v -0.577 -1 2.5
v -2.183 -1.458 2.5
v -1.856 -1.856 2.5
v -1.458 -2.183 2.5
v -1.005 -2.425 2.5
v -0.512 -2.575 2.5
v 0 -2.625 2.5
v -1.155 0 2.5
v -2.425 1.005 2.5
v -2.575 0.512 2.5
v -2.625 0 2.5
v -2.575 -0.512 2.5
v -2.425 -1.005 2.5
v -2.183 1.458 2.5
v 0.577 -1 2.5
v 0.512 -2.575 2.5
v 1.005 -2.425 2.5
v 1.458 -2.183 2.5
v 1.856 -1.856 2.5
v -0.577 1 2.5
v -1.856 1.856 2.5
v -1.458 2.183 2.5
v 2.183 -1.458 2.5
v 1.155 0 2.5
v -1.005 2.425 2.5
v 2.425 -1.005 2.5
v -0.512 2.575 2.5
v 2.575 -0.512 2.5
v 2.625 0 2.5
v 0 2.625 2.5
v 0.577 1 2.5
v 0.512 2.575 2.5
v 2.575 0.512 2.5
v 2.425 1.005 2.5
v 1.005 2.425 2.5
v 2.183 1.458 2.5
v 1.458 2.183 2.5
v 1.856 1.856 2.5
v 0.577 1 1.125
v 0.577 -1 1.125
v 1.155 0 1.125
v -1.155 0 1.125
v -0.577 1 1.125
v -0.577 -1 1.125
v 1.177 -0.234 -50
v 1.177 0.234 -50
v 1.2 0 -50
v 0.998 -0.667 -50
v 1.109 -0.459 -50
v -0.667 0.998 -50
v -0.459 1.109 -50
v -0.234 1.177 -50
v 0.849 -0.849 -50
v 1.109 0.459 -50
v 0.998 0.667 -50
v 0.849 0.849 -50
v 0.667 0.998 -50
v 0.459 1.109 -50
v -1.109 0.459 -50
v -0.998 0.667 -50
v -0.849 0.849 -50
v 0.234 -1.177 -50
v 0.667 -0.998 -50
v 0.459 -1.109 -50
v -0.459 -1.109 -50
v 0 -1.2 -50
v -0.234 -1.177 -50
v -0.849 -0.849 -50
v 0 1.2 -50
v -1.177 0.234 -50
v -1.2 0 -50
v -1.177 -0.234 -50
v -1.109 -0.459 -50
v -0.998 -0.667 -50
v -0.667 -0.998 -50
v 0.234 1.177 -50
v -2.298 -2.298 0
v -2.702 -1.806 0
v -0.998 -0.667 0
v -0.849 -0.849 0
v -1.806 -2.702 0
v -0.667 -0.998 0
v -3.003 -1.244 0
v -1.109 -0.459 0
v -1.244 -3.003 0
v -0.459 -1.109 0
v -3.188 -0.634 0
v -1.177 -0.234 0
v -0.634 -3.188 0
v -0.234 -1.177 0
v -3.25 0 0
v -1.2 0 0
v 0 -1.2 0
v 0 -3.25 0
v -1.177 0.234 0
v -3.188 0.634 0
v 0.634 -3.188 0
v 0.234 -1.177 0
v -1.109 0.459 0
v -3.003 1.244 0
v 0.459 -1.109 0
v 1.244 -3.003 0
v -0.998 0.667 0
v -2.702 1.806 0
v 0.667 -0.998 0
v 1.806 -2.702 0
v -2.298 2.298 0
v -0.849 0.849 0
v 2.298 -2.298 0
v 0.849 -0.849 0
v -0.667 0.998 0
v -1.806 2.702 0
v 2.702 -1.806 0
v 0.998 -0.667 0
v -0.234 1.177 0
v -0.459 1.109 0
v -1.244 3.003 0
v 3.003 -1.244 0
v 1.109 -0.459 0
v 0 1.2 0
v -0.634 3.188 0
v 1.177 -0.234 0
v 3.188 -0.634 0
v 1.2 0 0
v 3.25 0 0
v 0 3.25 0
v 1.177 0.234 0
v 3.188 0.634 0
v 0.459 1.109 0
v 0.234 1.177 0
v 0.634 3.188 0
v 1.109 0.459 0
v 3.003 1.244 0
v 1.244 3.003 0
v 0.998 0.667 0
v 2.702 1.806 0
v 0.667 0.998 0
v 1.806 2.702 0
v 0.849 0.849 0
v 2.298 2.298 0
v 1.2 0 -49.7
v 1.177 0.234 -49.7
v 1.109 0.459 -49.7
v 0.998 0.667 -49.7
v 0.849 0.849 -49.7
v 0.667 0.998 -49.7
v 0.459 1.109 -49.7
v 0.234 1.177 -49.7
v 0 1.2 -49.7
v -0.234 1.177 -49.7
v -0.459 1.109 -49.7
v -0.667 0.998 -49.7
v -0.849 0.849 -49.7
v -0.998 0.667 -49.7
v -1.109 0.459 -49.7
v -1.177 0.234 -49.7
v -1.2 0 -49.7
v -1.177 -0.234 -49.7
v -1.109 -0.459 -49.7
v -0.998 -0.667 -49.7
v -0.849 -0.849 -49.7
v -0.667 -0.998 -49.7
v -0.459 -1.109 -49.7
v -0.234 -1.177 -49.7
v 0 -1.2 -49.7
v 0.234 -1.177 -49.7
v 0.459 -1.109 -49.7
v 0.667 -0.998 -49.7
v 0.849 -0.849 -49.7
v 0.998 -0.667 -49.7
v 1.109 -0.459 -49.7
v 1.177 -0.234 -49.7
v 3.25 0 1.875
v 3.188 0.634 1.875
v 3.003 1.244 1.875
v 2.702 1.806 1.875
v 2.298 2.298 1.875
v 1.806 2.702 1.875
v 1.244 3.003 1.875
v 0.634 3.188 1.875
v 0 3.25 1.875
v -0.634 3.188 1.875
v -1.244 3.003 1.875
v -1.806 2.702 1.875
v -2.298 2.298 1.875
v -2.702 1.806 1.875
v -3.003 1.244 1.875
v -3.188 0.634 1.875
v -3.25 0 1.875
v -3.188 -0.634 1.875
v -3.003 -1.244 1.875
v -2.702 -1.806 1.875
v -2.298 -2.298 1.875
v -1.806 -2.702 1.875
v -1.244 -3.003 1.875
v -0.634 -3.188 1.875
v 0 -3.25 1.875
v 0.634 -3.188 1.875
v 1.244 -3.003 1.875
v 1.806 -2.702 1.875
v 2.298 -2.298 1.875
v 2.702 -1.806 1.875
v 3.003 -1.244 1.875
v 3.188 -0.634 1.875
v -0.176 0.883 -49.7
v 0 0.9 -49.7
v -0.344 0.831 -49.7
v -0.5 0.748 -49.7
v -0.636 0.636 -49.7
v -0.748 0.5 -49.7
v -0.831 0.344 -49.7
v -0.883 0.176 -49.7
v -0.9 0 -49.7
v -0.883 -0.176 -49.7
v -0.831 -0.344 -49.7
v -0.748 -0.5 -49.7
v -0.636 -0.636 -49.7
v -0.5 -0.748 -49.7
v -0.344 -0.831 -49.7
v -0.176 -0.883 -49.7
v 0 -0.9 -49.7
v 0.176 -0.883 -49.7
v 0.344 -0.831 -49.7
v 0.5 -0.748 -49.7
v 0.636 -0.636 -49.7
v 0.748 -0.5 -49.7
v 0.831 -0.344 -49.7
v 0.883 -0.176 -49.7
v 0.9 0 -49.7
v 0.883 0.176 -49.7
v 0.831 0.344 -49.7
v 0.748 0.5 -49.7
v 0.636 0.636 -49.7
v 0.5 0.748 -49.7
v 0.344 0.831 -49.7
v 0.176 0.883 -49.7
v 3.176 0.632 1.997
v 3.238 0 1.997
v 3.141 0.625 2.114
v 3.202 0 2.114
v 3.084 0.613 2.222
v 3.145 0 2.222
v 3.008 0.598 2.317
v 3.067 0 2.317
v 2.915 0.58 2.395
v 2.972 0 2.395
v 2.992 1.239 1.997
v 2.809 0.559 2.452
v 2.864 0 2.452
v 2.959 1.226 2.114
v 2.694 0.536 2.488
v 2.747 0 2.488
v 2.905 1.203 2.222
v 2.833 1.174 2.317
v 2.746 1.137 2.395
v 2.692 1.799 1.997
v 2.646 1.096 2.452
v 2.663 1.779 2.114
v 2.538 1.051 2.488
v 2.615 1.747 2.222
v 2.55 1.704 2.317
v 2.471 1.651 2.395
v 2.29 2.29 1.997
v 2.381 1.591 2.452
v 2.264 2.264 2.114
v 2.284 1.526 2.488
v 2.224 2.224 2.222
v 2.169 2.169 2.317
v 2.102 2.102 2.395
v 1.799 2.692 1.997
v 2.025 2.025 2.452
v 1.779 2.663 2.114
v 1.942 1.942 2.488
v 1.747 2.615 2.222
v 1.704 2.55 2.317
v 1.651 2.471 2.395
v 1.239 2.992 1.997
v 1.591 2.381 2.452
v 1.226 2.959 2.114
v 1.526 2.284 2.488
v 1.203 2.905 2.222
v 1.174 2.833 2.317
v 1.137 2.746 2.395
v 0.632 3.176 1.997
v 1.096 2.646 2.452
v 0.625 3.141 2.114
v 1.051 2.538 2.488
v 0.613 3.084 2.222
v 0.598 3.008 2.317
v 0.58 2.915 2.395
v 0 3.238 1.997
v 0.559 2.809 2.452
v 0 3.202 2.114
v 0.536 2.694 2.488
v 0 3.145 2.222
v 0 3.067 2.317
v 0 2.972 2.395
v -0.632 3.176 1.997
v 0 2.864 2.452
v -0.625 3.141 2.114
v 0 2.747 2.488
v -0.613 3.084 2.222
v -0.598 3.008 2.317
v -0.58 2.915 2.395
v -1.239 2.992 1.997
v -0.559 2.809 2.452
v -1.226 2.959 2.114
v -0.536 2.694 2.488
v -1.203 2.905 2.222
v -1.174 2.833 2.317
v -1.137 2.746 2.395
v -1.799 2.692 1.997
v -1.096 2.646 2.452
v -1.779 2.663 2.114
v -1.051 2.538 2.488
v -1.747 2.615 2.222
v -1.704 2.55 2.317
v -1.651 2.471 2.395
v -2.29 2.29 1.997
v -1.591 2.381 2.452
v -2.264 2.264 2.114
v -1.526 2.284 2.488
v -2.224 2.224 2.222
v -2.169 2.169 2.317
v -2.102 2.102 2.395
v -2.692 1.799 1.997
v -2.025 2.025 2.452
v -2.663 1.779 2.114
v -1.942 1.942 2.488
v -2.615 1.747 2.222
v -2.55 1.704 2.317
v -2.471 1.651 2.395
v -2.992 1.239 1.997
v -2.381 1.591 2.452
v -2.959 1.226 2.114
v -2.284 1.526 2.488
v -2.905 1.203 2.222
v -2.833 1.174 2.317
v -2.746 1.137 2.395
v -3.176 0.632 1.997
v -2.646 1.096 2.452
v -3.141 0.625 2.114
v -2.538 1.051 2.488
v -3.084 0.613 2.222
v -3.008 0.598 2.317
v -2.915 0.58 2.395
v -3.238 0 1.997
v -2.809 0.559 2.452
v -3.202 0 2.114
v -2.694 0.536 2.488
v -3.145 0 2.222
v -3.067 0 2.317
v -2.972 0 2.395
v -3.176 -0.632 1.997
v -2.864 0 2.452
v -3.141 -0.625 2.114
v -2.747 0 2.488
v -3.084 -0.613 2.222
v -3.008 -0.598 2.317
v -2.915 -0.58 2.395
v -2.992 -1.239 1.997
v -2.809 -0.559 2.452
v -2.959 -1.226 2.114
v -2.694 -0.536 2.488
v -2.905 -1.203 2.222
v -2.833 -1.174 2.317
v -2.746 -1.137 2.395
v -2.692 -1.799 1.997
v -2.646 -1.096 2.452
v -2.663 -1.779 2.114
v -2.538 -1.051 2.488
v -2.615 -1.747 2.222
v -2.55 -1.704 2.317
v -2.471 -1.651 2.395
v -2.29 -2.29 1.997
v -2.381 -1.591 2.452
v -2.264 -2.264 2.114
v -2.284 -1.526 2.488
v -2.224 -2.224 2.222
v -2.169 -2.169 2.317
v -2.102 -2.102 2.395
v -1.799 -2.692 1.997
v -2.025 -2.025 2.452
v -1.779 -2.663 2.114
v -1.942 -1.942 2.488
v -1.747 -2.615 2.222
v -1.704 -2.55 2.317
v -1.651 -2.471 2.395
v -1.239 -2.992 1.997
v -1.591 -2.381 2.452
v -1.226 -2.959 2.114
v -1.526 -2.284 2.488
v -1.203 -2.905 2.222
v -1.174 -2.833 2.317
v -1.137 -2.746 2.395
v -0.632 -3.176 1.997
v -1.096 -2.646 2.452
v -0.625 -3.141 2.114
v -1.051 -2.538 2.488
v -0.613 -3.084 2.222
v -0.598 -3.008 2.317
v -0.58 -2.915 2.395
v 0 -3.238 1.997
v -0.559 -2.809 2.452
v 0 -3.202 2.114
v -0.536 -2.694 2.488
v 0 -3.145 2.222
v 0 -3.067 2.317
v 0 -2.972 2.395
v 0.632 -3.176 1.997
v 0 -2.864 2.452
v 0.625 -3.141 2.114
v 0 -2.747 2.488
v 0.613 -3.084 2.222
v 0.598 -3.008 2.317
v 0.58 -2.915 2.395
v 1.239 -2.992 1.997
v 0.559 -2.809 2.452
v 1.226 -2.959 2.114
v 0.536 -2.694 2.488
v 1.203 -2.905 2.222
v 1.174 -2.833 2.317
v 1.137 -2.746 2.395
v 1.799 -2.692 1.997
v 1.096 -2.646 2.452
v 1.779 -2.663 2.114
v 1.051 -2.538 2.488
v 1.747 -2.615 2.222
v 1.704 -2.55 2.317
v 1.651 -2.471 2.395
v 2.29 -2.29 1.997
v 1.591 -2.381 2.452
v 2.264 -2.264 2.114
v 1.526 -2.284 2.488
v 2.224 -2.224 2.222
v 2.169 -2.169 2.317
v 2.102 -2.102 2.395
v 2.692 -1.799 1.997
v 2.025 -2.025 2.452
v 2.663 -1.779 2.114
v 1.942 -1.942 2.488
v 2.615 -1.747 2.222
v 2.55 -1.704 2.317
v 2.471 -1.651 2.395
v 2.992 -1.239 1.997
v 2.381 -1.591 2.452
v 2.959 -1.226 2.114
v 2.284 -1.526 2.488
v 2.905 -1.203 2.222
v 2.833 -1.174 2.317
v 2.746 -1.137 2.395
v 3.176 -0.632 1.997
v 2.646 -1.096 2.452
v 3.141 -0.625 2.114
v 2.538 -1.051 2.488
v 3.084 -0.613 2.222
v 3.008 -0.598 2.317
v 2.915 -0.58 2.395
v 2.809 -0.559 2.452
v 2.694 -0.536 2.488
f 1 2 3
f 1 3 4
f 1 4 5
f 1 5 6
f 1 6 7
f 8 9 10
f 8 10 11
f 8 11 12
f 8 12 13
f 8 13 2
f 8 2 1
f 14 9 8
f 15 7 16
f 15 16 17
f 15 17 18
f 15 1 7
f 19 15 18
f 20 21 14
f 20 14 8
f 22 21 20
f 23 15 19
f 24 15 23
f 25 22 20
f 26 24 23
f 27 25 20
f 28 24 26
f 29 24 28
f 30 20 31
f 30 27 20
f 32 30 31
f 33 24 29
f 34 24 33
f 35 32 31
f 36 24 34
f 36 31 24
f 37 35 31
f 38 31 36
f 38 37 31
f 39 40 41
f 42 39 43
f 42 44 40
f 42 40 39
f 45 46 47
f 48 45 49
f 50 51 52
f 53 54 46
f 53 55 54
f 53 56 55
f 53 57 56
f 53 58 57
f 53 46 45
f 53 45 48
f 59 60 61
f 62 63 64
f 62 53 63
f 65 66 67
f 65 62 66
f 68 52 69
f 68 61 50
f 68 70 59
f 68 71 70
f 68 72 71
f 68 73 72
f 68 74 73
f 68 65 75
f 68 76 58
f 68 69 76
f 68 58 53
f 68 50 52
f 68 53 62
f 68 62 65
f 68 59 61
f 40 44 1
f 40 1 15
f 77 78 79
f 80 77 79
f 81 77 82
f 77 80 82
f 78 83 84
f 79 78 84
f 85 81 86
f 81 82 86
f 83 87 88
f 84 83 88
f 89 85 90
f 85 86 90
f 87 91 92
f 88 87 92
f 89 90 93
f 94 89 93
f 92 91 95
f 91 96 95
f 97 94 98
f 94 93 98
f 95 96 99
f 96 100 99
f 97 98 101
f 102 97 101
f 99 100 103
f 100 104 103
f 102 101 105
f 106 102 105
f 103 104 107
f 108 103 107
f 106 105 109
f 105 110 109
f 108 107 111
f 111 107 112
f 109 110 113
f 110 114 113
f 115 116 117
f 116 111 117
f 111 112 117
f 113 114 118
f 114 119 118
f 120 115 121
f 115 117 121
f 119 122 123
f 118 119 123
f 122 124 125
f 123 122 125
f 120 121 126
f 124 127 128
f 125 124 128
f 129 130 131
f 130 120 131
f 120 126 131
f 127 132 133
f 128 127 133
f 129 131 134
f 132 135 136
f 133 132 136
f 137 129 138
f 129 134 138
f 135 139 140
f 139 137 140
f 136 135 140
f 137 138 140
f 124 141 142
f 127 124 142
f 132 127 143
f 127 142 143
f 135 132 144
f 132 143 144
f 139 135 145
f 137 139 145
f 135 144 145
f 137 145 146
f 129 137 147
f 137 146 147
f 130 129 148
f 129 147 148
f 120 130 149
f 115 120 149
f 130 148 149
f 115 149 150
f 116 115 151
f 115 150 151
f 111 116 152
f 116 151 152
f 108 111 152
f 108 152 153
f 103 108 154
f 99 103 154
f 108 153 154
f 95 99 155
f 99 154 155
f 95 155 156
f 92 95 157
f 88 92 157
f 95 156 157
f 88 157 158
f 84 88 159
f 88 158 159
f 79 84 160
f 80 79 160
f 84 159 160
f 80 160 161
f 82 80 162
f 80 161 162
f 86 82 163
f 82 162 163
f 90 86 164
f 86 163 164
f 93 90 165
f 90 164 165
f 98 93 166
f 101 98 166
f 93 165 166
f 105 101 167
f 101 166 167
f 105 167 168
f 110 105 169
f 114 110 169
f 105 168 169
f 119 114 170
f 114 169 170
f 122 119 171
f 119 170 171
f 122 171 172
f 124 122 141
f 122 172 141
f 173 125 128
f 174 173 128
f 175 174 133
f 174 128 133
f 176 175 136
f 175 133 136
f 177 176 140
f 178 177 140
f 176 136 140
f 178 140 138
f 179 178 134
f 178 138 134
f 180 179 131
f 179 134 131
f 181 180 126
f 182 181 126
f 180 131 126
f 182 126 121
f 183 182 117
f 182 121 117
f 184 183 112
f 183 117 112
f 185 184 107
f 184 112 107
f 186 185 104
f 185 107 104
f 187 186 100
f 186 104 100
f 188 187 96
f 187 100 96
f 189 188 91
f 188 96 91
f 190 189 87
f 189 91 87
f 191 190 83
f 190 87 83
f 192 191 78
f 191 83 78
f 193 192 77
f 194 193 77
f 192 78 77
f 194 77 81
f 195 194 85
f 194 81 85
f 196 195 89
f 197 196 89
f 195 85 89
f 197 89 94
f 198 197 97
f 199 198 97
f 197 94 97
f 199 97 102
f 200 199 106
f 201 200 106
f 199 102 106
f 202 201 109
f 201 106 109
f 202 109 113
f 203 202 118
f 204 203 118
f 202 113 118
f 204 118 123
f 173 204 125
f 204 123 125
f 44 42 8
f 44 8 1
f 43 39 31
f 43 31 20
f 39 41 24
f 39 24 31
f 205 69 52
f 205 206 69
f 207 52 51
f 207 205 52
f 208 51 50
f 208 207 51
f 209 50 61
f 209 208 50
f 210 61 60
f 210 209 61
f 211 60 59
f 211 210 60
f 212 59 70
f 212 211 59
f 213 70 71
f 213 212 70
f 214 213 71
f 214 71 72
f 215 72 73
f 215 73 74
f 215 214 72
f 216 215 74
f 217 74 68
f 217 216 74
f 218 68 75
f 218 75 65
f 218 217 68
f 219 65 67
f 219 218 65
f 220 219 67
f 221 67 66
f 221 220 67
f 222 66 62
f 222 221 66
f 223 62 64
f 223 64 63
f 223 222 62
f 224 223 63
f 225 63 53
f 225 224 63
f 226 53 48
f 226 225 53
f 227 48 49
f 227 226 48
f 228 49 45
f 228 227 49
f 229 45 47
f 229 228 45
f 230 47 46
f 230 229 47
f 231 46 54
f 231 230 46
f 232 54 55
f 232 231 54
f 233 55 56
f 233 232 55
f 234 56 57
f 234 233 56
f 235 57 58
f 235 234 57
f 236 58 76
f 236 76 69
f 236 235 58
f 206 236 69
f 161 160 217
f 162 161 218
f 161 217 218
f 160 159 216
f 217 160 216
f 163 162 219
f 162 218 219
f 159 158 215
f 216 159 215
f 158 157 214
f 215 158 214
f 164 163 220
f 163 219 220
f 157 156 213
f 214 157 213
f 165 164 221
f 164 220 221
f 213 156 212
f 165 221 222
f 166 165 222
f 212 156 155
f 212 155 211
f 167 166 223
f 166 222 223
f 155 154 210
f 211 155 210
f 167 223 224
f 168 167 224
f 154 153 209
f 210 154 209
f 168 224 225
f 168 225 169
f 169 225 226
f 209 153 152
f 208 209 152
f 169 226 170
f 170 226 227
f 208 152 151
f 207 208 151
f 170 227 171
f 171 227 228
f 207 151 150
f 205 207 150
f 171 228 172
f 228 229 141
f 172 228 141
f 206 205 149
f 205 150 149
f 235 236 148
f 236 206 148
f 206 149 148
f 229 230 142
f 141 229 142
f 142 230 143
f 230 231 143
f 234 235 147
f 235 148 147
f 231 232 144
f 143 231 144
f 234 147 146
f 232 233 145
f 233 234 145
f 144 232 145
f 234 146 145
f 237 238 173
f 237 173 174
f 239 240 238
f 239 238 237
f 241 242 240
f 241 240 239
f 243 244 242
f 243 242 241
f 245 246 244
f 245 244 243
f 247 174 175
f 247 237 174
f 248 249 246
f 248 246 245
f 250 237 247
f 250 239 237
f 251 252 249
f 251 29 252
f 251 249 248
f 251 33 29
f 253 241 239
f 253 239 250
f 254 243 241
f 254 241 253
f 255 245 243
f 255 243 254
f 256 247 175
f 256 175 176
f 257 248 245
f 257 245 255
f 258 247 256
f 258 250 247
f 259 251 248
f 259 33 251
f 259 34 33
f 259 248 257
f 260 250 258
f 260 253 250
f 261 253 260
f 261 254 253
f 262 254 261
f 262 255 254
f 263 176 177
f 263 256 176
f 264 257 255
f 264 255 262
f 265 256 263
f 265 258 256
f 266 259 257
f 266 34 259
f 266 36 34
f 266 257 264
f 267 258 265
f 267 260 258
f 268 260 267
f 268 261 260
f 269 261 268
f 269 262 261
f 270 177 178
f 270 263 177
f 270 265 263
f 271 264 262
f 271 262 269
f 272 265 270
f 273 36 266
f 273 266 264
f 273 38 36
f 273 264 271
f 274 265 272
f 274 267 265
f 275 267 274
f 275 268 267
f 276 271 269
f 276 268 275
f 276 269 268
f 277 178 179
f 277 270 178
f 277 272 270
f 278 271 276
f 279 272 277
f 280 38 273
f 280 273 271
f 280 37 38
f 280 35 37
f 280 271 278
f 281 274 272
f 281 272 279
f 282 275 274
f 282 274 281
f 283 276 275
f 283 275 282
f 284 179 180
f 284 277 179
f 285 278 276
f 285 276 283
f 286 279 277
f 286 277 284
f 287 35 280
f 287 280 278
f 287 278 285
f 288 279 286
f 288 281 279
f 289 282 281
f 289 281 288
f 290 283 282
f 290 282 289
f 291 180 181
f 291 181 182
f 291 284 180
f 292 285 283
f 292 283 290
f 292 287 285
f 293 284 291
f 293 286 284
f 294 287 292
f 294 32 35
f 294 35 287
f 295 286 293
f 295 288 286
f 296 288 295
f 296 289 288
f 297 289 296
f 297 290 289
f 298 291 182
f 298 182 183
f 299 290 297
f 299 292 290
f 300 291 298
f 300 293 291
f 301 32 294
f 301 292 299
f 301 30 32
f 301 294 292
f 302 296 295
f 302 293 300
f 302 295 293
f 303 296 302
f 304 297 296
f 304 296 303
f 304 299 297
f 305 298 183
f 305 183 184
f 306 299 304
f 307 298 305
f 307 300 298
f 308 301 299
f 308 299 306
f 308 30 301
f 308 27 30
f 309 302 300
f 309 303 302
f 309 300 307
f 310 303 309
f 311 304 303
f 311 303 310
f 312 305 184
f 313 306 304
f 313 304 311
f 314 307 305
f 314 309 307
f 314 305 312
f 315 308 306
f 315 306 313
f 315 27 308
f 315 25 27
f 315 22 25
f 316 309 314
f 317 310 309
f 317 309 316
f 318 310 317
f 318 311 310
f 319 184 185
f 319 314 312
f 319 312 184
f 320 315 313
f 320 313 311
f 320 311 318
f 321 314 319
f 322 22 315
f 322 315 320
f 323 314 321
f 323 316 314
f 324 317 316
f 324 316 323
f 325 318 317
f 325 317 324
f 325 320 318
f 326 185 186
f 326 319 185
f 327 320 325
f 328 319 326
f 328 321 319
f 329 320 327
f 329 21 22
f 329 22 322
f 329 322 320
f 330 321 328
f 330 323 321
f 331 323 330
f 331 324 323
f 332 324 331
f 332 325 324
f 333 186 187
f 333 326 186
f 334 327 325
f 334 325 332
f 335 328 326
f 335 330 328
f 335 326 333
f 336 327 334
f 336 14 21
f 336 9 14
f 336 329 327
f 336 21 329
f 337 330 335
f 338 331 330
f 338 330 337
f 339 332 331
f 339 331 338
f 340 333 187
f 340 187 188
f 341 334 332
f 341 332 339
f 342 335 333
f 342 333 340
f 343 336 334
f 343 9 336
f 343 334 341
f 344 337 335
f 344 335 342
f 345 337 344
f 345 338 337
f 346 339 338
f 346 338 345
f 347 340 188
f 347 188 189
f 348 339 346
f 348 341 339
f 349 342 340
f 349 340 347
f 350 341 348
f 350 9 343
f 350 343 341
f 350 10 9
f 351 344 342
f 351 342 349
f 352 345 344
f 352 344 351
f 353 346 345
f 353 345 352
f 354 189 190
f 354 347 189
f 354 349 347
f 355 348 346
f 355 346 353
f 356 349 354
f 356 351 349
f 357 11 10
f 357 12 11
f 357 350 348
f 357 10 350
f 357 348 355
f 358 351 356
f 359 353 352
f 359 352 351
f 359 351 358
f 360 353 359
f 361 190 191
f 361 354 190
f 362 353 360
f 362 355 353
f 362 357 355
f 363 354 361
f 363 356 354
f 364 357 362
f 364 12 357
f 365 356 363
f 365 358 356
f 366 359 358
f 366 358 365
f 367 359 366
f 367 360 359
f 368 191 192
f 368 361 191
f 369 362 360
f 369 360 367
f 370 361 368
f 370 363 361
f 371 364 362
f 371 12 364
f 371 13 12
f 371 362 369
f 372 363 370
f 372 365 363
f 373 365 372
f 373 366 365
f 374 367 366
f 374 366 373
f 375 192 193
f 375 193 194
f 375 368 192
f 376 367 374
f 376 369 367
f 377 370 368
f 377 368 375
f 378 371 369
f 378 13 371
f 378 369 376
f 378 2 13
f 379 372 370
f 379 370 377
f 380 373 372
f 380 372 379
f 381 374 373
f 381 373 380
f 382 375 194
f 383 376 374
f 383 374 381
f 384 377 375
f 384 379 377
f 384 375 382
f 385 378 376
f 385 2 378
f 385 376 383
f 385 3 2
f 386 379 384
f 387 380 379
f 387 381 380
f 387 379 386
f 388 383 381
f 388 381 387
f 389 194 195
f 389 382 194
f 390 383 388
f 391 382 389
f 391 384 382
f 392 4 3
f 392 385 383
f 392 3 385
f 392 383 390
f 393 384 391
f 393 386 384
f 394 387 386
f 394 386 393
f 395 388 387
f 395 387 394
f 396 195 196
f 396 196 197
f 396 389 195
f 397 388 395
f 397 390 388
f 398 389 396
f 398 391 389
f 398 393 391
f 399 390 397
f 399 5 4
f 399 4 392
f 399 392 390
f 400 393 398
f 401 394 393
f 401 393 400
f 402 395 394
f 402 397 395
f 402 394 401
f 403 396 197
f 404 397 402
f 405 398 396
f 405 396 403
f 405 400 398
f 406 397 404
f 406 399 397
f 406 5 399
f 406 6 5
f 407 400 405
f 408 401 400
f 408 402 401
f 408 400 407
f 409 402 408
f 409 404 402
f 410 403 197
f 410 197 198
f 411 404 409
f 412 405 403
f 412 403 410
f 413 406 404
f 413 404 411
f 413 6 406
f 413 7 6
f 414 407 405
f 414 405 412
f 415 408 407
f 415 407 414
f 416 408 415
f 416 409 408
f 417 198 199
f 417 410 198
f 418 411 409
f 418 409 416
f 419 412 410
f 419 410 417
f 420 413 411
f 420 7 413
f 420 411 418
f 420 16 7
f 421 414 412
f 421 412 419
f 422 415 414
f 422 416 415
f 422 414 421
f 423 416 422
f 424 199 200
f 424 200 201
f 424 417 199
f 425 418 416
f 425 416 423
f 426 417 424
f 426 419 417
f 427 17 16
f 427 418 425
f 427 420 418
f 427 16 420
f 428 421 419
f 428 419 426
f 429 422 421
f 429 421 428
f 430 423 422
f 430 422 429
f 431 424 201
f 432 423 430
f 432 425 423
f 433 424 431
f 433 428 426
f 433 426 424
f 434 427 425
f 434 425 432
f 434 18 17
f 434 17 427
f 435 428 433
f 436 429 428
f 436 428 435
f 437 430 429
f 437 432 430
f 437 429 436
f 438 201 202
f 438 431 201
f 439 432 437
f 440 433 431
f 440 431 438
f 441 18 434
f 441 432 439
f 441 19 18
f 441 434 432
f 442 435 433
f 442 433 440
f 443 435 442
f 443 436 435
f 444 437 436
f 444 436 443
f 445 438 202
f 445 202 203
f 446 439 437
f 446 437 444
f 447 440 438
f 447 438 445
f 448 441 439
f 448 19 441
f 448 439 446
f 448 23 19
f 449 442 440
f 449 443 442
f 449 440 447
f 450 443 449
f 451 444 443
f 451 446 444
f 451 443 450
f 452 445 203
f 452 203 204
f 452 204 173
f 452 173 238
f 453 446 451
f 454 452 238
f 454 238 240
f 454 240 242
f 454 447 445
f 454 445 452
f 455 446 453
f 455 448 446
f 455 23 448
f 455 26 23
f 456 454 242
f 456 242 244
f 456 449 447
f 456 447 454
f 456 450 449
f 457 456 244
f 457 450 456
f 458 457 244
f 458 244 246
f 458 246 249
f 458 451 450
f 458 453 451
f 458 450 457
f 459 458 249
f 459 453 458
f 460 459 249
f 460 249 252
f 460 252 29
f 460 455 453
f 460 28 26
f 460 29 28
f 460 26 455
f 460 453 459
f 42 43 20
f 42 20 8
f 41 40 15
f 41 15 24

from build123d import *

# Parameters (mm, degrees)
F_0120_CYLINDER_SKETCH_R    = 3.25
F_0120_CYLINDER_DEPTH       = 2.5
F_0121_FILLET_R             = 0.625
F_0122_EXTRUDE_DEPTH        = 1.385
F_0122_EXTRUDE_ROTATE_ANGLE = 120
F_0125_CYLINDER_SKETCH_R    = 1.2
F_0125_CYLINDER_DEPTH       = 49.7
F_0126_CONE_ROTATE_ANGLE    = 90


with BuildPart() as part:
    # 0120_cylinder_Sketch → 0120_cylinder (new body)
    with BuildSketch(Plane.XY):
        Circle(F_0120_CYLINDER_SKETCH_R)
    extrude(amount=F_0120_CYLINDER_DEPTH)

    # 0121_fillet
    f_0121_fillet_edges = [part.edges().sort_by_distance(p)[0] for p in [
        (-3.25, 0, 2.5),
    ]]
    fillet(f_0121_fillet_edges, radius=F_0121_FILLET_R)


with BuildPart() as body_2:
    # 0122_extrude_Sketch → 0122_extrude (new body)
    with BuildSketch(Plane.XY):
        Polygon((0, 0), (1.154700538, 0), (1.732050808, 1), (1.154700538, 2), (0, 2), (-0.577350269, 1), align=None)
    extrude(amount=F_0122_EXTRUDE_DEPTH)


with BuildPart() as body_2_1:
    # 0122_extrude_Rotate: read off the stored shape, not the designer's step
    # 0122_extrude_Rotate: moved
    add(body_2.part.rotate(Axis((0, 0, 0), (0, 0, 1)), F_0122_EXTRUDE_ROTATE_ANGLE))


with BuildPart() as body_2_2:
    # 0122_extrude_Translate: moved
    add(body_2_1.part.moved(Location((1.154700538, 0, 1.125))))


with BuildPart() as part_1:
    add(part.part)

    # 0124_sub: cut body 2
    add(body_2_2.part, mode=Mode.SUBTRACT)


with BuildPart() as body_2_2_1:
    # 0125_cylinder_Sketch → 0125_cylinder (new body)
    with BuildSketch(Plane.XY):
        Circle(F_0125_CYLINDER_SKETCH_R)
    extrude(amount=F_0125_CYLINDER_DEPTH)


with BuildPart() as body_2_2_2:
    # 0125_cylinder_Translate: moved
    add(body_2_2_1.part.moved(Location((0, 0, -49.7))))


with BuildPart() as body_3:
    # 0126_cone_Sketch → 0126_cone (revolve)
    with BuildSketch(Plane.XY, mode=Mode.PRIVATE) as f_0126_cone_sk:
        Polygon((0, 0), (1.2, 0), (0.9, 0.3), (0, 0.3), align=None)
    revolve(f_0126_cone_sk.sketch.rotate(Axis((0, -100, 0), (0, 1, 0)), 90), axis=Axis((0, -100, 0), (0, 1, 0)))


with BuildPart() as body_3_1:
    # 0126_cone_Rotate: moved
    add(body_3.part.rotate(Axis((0, 0, 0), (1, 0, 0)), F_0126_CONE_ROTATE_ANGLE))


with BuildPart() as body_3_2:
    # 0126_cone_Translate: moved
    add(body_3_1.part.moved(Location((0, 0, -50))))


with BuildPart() as body_2_2_3:
    add(body_2_2_2.part)

    # 0128_add: union body 3
    add(body_3_2.part)


with BuildPart() as part_2:
    add(part_1.part)

    # 0129_add: union body 2 2
    add(body_2_2_3.part)


solid = part_2.part
